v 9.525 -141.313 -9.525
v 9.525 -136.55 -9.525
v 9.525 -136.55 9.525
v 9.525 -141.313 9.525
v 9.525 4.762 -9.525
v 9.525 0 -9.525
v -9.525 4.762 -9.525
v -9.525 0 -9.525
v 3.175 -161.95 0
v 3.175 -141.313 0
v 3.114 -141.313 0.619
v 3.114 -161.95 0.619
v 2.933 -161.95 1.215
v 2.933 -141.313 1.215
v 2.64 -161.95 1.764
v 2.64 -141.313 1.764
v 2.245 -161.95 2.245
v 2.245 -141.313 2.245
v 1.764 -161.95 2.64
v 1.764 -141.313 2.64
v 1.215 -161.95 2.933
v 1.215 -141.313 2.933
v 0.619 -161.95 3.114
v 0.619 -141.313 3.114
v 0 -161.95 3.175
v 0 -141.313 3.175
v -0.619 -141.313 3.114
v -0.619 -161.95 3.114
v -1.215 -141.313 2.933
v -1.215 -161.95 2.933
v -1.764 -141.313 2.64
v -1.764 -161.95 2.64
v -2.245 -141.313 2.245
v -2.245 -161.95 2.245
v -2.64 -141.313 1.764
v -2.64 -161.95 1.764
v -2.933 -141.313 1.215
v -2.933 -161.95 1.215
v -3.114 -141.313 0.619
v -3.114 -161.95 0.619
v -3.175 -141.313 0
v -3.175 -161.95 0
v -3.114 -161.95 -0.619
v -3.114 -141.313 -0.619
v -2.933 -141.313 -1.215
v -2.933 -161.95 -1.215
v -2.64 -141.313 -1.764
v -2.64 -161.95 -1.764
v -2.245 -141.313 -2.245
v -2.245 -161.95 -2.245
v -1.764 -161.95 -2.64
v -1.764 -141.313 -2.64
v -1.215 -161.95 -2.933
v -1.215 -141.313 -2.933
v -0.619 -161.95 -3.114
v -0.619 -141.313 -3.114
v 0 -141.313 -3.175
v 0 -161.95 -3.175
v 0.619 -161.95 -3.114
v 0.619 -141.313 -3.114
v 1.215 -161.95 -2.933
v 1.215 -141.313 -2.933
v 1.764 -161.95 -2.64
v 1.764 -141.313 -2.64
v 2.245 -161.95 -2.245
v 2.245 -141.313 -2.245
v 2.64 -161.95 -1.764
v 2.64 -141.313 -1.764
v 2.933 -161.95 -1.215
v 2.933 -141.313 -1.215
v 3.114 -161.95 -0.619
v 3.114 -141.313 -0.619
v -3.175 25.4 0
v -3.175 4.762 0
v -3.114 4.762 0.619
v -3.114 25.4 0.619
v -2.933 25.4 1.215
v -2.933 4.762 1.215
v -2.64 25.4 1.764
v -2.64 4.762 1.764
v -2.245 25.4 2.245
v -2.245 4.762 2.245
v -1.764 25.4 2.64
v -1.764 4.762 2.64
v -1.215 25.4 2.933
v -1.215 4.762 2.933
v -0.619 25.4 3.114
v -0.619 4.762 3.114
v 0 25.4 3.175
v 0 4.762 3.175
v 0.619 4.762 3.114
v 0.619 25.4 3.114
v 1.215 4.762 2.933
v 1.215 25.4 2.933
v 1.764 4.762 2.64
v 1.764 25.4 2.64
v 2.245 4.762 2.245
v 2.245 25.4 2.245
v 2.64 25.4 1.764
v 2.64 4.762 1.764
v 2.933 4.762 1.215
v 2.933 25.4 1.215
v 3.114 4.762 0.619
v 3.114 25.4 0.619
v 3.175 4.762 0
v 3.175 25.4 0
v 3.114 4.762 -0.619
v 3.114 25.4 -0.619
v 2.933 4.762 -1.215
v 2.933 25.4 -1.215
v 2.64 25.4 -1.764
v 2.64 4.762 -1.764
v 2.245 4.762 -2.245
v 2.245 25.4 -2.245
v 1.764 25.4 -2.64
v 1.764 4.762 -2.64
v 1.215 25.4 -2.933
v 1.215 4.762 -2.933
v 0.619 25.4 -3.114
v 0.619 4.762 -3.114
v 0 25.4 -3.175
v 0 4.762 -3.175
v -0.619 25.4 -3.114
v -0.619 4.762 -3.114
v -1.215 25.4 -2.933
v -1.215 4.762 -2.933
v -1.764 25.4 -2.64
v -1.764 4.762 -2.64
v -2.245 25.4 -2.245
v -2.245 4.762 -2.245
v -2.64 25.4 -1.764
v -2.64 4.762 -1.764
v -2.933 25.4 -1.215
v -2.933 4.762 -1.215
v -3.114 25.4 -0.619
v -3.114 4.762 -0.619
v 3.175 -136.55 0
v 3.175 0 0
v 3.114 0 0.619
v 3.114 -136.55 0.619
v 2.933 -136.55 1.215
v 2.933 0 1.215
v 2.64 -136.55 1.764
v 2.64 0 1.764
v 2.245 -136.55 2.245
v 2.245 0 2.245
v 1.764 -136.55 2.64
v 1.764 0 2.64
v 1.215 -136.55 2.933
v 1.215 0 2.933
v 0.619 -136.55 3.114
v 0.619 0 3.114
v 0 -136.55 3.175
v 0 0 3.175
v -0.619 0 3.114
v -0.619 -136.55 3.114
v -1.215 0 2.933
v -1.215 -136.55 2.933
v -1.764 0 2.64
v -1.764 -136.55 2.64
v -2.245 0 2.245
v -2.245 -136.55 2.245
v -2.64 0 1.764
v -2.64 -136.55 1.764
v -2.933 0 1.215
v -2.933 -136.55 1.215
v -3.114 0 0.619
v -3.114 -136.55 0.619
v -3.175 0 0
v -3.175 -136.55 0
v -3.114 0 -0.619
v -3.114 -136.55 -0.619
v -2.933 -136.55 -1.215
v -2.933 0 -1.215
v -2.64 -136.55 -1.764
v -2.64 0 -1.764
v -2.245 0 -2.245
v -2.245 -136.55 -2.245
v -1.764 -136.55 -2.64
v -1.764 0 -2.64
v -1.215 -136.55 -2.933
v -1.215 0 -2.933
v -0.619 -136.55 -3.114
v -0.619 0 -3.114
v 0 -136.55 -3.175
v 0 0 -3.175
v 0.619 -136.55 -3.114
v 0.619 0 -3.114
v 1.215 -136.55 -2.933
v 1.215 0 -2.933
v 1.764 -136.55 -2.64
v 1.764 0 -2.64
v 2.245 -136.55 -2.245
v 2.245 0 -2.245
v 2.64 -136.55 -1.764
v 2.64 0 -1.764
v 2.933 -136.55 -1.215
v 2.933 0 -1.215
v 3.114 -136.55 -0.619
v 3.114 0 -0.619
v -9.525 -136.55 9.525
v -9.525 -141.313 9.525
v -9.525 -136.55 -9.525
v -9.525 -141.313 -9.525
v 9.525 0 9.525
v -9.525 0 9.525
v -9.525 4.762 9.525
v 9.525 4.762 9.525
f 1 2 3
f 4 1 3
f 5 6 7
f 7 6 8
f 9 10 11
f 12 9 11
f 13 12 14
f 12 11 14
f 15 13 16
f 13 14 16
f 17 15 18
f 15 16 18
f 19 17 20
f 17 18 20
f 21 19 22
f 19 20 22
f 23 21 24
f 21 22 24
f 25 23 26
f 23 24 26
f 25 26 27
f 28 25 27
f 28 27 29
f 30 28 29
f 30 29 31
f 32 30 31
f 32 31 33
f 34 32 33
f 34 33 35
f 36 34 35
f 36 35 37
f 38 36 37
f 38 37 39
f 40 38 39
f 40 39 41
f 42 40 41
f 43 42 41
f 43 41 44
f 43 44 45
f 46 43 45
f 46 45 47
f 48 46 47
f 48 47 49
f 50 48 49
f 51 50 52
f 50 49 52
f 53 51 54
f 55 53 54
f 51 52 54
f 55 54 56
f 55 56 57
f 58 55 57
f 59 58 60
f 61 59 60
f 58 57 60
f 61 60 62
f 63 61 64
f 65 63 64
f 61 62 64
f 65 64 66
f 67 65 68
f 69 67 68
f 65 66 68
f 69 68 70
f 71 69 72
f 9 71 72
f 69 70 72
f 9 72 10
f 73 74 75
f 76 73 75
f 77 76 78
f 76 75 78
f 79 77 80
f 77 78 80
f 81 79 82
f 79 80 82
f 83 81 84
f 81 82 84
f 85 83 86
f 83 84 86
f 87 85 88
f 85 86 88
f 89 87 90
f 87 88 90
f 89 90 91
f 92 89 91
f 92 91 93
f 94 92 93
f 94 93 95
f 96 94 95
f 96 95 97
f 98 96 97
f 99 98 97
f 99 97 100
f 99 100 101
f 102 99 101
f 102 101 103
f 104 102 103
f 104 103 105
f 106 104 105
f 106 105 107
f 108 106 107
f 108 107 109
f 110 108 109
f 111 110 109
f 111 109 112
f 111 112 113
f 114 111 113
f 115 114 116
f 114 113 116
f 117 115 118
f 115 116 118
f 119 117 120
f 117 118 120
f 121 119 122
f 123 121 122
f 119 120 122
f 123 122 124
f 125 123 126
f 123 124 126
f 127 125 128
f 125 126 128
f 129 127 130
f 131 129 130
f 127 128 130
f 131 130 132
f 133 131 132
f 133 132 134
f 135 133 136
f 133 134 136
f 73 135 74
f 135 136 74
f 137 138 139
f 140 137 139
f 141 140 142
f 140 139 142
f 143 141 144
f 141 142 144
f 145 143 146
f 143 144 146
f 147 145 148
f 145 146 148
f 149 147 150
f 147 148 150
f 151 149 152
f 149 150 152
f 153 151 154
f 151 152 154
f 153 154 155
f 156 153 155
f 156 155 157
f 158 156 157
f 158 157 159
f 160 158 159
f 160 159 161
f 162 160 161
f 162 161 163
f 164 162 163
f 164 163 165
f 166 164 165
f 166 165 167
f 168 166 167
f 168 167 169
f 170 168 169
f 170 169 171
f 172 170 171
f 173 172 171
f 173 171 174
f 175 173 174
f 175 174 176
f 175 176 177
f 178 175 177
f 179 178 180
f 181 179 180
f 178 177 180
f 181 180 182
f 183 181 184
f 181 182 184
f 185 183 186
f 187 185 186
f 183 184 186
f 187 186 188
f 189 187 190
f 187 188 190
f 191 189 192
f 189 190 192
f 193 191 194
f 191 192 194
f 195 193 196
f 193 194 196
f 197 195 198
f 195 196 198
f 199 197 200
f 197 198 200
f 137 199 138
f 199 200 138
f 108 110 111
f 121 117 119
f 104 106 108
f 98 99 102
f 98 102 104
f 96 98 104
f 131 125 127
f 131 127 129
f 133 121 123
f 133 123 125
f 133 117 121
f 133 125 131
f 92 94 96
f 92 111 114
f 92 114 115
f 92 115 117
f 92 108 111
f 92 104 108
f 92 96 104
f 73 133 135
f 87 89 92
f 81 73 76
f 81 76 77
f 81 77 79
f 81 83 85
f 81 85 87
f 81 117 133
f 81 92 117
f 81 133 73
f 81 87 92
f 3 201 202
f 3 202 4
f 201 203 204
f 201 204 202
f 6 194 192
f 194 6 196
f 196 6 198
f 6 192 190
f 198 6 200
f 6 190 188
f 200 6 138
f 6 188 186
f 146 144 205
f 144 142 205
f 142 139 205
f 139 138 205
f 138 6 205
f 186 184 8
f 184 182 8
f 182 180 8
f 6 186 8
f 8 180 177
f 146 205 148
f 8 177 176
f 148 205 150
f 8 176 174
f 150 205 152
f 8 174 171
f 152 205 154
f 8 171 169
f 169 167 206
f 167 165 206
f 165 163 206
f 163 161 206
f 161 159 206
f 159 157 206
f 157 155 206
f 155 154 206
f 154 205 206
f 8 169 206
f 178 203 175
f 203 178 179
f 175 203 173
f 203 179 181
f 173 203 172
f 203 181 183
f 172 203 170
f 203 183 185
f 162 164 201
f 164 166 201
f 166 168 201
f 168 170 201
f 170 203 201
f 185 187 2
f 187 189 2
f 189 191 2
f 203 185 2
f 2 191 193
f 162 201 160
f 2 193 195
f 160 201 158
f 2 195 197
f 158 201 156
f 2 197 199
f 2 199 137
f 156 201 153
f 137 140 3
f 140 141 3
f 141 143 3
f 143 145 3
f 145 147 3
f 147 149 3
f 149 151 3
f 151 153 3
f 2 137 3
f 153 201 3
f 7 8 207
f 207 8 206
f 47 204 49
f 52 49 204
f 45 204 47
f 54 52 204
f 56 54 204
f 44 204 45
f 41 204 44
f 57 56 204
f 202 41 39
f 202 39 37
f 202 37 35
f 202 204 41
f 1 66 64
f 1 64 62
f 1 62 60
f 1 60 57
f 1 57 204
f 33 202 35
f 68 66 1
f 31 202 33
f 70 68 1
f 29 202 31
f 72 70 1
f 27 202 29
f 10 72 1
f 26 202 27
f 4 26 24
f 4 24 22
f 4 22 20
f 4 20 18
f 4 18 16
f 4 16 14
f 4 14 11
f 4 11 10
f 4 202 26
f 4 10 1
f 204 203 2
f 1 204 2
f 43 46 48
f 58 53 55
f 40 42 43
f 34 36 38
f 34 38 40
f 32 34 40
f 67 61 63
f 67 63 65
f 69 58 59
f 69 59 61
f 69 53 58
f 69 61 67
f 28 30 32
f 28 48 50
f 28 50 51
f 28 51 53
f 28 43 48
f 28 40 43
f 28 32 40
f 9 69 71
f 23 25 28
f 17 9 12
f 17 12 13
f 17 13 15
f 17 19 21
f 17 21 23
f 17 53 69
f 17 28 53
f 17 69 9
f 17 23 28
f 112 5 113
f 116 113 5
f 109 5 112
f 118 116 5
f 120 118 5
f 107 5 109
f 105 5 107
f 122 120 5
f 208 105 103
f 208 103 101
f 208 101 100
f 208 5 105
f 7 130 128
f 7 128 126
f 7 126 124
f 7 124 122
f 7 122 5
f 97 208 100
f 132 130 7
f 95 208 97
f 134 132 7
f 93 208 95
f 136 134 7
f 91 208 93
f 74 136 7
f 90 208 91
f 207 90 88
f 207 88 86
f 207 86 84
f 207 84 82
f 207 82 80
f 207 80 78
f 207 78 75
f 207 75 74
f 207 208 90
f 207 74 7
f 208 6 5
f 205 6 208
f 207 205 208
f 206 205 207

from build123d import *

# Parameters (mm, degrees)
F0_R     = 3.175
F1_DEPTH = 136.5504
F2_W     = 19.05
F2_H     = 19.05
F3_DEPTH = 4.7625
F4_W     = 19.05
F4_H     = 19.05
F5_DEPTH = 4.7625
F6_R     = 3.175
F7_DEPTH = 25.4
F8_R     = 3.175
F9_DEPTH = 25.4


with BuildPart() as f1:
    # F0 (on Front) → F1 (new body)
    with BuildSketch(Plane.XZ):
        Circle(F0_R)
    extrude(amount=F1_DEPTH)

    # F2 (on face) → F3 (join)
    with BuildSketch(Plane.XZ.offset(136.5504)):
        Rectangle(F2_W, F2_H)
    extrude(amount=F3_DEPTH)

    # F4 (on face) → F5 (join)
    with BuildSketch(Plane(origin=(0, 0, 0), x_dir=(-1, 0, 0), z_dir=(0, 1, 0))):
        Rectangle(F4_W, F4_H)
    extrude(amount=F5_DEPTH)

    # F6 (on face) → F7 (join)
    with BuildSketch(Plane.XZ.offset(136.5504)):
        Circle(F6_R)
    extrude(amount=F7_DEPTH)

    # F8 (on face) → F9 (join)
    with BuildSketch(Plane(origin=(0, 0, 0), x_dir=(-1, 0, 0), z_dir=(0, 1, 0))):
        Circle(F8_R)
    extrude(amount=F9_DEPTH)


solid = f1.part
